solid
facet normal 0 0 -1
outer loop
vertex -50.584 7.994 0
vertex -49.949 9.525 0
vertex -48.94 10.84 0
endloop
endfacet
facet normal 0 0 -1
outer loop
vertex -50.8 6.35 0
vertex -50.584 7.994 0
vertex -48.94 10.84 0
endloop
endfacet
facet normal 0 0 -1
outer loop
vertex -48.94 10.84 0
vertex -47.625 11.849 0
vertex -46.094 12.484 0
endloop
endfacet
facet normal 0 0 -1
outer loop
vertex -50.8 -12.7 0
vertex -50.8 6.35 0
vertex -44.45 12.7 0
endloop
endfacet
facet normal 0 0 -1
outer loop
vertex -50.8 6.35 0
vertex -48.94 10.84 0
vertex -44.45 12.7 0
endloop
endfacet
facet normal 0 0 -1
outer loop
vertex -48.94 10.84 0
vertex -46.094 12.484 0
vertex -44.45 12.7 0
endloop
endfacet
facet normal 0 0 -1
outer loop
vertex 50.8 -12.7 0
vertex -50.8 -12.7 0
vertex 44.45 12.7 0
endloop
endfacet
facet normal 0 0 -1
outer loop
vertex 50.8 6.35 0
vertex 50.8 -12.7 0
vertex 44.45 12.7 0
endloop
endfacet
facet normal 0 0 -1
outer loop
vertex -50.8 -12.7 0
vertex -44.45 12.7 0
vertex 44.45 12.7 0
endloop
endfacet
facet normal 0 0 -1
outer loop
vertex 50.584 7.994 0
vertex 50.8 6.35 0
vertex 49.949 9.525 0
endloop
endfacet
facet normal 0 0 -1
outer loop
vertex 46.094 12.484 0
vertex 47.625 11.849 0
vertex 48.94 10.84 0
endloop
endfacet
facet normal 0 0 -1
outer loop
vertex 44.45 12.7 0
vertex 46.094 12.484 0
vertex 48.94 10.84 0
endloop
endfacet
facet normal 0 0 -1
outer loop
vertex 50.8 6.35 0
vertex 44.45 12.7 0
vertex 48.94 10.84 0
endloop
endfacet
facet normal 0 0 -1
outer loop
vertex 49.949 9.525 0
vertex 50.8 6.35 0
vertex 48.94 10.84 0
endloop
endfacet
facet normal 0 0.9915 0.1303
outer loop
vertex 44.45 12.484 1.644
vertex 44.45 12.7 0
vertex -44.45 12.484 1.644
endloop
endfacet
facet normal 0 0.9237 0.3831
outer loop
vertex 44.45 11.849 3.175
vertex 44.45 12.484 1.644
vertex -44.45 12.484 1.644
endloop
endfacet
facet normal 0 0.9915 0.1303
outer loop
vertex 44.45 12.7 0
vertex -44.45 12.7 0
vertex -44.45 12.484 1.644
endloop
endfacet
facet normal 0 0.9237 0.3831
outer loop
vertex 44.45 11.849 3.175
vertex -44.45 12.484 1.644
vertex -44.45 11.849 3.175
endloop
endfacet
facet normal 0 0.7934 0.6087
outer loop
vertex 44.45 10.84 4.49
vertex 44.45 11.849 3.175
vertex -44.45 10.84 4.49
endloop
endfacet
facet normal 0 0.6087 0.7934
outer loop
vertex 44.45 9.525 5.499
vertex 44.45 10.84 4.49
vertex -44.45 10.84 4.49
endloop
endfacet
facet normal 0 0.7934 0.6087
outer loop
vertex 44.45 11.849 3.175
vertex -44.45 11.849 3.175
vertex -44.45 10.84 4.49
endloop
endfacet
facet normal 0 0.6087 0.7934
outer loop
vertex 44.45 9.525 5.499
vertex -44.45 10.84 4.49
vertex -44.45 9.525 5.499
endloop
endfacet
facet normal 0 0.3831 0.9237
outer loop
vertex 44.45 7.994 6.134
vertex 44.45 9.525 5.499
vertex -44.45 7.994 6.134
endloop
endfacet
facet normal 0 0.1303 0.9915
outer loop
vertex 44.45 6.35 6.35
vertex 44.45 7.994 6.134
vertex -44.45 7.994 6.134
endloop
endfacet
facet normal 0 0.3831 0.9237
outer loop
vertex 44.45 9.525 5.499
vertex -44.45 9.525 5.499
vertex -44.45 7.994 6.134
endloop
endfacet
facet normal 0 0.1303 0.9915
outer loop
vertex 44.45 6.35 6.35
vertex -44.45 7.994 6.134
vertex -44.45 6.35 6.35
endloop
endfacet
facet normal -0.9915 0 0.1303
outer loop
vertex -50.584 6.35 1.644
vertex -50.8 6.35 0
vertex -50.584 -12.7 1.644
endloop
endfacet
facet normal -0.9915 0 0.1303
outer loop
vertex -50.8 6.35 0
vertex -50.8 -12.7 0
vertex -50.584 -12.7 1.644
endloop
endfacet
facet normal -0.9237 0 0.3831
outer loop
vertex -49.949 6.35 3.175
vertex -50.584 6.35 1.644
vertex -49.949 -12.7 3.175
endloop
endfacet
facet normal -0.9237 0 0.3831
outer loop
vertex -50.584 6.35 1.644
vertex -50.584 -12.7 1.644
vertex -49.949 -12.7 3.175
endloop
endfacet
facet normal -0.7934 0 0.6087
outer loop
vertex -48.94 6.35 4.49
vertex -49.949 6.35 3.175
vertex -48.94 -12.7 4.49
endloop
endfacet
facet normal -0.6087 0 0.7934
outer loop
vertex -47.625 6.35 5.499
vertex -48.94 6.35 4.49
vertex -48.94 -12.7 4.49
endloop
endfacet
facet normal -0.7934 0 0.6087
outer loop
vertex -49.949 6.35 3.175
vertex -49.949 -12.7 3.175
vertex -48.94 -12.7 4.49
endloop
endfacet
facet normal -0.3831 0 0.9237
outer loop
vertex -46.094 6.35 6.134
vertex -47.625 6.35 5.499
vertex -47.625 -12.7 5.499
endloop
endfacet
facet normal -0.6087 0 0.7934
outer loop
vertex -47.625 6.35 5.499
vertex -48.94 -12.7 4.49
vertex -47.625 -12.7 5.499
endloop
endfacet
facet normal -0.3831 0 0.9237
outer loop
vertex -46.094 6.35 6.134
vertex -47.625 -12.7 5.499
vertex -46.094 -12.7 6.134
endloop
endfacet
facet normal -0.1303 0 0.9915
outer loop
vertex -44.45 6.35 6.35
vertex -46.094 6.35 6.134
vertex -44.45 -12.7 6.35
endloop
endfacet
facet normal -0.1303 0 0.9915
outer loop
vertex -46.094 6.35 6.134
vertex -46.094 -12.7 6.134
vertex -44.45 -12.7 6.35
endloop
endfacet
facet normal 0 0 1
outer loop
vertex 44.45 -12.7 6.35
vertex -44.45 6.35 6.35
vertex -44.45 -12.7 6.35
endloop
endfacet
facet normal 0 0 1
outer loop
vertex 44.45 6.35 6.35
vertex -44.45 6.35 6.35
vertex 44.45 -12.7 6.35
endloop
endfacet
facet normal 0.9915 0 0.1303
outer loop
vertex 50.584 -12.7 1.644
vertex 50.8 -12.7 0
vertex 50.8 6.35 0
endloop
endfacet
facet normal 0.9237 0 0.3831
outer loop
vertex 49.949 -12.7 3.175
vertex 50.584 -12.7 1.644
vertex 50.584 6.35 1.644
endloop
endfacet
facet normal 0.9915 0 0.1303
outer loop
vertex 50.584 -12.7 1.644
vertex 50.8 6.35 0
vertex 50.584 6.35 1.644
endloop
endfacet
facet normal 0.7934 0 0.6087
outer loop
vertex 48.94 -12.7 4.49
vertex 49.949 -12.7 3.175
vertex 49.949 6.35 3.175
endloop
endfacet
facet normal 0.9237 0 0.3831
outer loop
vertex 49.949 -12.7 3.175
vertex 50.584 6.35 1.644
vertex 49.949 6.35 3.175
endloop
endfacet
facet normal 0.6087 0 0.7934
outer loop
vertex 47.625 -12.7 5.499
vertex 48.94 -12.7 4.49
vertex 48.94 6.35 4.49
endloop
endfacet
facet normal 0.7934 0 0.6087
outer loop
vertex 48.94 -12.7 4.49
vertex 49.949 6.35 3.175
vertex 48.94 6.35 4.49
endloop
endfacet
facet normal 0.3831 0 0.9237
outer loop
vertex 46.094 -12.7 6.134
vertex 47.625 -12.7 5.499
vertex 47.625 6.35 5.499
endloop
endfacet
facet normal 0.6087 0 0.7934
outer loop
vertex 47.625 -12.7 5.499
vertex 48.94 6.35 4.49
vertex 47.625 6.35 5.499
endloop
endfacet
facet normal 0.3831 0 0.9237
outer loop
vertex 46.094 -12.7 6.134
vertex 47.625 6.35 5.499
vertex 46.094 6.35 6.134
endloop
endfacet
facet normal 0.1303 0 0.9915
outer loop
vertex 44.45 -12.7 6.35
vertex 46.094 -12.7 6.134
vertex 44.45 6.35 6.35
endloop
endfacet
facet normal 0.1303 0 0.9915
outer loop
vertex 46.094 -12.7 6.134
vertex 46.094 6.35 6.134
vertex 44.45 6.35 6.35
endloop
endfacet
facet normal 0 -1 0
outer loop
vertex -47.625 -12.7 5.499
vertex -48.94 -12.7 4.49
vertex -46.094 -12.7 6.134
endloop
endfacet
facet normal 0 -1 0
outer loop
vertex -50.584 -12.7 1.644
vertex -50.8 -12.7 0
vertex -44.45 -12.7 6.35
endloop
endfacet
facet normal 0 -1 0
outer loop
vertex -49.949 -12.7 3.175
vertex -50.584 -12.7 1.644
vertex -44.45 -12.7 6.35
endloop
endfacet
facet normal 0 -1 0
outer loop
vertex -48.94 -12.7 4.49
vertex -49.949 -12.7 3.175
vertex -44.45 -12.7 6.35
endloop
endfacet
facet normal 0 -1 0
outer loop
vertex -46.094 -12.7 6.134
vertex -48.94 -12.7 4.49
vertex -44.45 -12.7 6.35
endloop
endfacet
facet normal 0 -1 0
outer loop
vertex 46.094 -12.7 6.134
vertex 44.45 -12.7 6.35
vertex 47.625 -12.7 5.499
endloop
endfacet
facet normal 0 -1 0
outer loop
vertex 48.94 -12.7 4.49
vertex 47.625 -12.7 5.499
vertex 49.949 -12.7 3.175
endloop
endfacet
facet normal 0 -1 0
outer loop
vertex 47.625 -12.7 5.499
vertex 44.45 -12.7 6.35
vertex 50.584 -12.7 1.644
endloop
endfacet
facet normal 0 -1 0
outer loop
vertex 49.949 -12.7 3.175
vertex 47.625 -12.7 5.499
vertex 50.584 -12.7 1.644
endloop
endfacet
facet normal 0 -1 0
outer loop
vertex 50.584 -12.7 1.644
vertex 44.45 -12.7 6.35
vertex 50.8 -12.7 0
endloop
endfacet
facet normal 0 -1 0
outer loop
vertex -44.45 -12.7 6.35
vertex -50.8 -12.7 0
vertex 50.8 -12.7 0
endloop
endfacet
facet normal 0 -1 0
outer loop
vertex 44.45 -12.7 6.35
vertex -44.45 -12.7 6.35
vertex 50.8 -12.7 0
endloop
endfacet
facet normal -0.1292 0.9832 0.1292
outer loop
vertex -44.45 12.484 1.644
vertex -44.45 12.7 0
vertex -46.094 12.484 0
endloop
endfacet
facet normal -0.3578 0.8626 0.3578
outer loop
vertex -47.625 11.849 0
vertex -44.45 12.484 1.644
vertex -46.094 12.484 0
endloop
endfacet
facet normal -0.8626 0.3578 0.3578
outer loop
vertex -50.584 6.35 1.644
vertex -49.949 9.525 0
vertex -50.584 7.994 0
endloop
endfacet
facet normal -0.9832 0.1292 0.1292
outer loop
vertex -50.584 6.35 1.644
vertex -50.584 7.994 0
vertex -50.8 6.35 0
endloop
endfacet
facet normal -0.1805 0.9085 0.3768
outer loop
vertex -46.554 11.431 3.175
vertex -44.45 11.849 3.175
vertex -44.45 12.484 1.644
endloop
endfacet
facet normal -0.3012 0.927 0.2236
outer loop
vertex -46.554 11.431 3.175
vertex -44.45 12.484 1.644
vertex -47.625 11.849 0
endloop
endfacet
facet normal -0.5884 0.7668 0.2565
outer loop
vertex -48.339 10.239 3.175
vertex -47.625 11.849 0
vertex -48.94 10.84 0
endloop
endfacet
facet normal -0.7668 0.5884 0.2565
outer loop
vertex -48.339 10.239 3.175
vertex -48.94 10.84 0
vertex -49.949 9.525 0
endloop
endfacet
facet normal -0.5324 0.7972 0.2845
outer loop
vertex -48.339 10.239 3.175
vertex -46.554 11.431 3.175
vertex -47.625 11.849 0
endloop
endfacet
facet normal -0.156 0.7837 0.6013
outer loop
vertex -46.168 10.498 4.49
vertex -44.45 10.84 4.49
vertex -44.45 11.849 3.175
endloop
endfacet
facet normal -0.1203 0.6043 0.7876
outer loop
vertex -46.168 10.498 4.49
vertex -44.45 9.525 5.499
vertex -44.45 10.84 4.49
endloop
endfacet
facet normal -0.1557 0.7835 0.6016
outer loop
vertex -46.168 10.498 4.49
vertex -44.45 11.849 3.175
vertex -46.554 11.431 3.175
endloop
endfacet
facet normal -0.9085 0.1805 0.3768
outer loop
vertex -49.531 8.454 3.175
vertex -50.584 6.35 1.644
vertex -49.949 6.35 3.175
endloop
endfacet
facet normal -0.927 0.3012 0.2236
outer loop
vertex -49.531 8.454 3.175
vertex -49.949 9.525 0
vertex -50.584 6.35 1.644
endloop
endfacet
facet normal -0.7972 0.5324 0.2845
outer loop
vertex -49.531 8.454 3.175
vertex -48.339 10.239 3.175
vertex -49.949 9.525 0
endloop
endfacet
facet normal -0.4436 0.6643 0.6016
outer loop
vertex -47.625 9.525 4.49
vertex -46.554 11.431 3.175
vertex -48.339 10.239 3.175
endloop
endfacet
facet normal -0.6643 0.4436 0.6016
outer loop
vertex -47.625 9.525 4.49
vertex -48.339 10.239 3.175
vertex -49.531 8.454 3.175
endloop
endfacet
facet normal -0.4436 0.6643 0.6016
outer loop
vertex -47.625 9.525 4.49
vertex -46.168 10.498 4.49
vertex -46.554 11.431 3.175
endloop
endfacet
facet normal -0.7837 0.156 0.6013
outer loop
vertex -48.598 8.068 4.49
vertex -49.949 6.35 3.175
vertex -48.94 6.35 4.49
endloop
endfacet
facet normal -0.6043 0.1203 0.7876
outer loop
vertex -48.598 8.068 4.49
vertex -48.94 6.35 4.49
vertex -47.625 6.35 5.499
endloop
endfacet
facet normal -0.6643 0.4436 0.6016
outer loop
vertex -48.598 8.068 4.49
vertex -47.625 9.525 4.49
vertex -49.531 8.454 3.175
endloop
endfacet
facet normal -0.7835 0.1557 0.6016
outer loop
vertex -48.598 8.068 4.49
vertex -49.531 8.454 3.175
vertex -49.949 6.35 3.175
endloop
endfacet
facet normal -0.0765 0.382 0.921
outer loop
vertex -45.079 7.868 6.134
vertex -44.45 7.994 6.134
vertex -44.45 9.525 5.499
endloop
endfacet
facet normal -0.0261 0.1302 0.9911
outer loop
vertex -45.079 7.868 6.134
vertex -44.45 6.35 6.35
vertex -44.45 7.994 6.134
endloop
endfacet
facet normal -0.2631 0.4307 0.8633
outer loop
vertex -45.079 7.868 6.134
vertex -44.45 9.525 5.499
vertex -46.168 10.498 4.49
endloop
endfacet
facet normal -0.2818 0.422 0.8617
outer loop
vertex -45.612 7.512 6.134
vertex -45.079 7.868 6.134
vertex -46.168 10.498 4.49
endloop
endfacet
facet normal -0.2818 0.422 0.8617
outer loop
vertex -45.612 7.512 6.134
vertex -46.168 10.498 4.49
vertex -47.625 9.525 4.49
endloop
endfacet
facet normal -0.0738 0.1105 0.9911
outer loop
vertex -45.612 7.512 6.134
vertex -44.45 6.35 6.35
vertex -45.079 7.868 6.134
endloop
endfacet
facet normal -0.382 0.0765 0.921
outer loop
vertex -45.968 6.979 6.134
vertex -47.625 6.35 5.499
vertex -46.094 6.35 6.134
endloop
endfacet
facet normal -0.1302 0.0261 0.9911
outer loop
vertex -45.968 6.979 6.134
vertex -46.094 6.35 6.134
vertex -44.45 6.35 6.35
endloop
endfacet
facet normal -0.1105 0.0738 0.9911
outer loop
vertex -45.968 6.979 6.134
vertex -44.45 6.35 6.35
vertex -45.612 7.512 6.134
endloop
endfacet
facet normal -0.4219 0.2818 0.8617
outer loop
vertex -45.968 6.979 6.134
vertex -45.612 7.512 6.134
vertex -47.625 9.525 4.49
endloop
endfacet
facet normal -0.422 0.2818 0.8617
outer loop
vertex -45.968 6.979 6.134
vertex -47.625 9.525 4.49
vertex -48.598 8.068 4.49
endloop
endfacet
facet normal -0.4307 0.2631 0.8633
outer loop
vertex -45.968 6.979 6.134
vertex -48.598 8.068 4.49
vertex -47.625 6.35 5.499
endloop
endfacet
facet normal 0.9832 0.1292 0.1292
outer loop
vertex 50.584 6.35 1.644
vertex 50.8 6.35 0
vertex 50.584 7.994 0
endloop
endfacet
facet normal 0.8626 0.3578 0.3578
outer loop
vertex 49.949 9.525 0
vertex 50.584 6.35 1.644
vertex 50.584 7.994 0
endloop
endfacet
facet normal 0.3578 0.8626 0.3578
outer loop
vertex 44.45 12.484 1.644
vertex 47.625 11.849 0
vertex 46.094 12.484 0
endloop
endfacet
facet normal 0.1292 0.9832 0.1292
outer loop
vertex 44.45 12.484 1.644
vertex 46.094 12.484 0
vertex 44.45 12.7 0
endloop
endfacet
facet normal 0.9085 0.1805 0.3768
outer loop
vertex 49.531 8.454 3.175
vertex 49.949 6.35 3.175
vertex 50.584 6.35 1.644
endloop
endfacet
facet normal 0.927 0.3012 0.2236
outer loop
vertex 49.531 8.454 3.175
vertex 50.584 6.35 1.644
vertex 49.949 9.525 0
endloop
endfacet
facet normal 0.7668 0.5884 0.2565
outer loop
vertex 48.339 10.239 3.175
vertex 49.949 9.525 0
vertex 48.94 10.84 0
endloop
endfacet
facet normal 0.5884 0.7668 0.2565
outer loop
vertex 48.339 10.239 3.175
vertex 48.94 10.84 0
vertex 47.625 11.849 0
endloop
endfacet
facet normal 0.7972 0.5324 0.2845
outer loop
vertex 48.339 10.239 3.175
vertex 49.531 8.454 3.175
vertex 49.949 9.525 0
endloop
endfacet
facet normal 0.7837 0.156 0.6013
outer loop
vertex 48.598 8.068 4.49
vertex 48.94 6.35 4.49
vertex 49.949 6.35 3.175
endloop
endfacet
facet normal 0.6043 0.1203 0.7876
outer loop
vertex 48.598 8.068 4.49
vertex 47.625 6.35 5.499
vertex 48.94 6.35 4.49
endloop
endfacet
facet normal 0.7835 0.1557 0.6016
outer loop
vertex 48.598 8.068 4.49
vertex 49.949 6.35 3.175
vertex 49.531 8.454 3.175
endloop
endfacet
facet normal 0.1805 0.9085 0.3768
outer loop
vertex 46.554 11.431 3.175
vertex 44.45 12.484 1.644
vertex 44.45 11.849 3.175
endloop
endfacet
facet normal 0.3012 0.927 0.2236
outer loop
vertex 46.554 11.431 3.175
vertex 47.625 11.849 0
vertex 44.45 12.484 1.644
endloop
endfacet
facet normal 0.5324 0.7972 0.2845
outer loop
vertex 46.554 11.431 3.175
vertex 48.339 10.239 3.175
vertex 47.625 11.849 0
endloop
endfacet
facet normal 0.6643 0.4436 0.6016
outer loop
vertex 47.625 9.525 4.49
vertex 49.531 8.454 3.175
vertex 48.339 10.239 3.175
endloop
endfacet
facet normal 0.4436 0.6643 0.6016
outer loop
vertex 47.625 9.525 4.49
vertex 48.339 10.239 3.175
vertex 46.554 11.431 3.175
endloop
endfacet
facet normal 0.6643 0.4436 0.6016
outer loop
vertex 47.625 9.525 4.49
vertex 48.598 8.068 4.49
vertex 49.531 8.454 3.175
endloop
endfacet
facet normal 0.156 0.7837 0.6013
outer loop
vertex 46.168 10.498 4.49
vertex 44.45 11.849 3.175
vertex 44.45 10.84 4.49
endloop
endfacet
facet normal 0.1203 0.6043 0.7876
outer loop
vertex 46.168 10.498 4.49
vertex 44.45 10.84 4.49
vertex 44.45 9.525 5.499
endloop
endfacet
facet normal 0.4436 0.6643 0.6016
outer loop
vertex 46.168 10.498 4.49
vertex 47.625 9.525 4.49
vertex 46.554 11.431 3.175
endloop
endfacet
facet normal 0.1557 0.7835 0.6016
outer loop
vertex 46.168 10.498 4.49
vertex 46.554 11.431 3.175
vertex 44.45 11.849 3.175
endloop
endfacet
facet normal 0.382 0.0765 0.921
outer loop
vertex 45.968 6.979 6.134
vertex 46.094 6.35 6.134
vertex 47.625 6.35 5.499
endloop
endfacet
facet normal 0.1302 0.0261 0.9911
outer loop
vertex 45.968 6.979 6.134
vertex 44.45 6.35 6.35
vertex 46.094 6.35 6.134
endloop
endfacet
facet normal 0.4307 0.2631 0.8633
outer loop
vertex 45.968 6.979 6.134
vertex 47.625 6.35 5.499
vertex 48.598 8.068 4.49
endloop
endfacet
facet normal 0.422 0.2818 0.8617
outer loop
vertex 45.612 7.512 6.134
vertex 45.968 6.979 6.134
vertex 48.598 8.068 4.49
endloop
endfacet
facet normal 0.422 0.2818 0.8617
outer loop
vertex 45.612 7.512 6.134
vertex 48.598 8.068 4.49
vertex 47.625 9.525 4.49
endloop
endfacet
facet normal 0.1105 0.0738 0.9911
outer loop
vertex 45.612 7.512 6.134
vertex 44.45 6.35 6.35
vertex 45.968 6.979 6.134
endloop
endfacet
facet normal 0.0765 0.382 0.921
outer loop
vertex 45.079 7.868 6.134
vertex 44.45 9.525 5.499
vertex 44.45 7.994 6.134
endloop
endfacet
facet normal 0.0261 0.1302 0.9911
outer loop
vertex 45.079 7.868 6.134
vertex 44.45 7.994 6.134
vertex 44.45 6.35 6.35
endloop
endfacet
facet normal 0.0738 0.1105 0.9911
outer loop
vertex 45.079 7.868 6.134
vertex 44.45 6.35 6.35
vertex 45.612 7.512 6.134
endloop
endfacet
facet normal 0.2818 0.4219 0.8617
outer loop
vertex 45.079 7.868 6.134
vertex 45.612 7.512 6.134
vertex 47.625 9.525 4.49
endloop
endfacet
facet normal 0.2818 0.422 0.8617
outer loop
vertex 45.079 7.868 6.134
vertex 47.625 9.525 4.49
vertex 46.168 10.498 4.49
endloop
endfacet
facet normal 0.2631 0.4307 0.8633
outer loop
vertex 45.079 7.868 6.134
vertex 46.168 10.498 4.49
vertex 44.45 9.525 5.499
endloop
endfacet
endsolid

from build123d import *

# Parameters (mm, degrees)
F1_DEPTH = 6.35
F2_R     = 6.34999


# Not quite as in the source:
# - a fillet or chamfer is up to 0.001 mm smaller than in the source, because OpenCascade refuses the exact size


with BuildPart() as f1:
    # F0 (on Top) → F1 (new body)
    with BuildSketch(Plane.XY):
        with BuildLine():
            ThreePointArc((50.8, 6.35), (48.9401280605, 10.8401280605), (44.45, 12.7))
            Line((44.45, 12.7), (-44.45, 12.7))
            ThreePointArc((-44.45, 12.7), (-48.9401280605, 10.8401280605), (-50.8, 6.35))
            Line((-50.8, 6.35), (-50.8, -12.7))
            Line((-50.8, -12.7), (50.8, -12.7))
            Line((50.8, -12.7), (50.8, 6.35))
        make_face()
    extrude(amount=F1_DEPTH)

    # F2 (radius 6.35 in the source; OpenCascade refuses exactly that, so slightly less here)
    f2_edges = [f1.edges().sort_by_distance(p)[0] for p in [
        (0, 12.7, 6.35),
    ]]
    fillet(f2_edges, radius=F2_R)


solid = f1.part
